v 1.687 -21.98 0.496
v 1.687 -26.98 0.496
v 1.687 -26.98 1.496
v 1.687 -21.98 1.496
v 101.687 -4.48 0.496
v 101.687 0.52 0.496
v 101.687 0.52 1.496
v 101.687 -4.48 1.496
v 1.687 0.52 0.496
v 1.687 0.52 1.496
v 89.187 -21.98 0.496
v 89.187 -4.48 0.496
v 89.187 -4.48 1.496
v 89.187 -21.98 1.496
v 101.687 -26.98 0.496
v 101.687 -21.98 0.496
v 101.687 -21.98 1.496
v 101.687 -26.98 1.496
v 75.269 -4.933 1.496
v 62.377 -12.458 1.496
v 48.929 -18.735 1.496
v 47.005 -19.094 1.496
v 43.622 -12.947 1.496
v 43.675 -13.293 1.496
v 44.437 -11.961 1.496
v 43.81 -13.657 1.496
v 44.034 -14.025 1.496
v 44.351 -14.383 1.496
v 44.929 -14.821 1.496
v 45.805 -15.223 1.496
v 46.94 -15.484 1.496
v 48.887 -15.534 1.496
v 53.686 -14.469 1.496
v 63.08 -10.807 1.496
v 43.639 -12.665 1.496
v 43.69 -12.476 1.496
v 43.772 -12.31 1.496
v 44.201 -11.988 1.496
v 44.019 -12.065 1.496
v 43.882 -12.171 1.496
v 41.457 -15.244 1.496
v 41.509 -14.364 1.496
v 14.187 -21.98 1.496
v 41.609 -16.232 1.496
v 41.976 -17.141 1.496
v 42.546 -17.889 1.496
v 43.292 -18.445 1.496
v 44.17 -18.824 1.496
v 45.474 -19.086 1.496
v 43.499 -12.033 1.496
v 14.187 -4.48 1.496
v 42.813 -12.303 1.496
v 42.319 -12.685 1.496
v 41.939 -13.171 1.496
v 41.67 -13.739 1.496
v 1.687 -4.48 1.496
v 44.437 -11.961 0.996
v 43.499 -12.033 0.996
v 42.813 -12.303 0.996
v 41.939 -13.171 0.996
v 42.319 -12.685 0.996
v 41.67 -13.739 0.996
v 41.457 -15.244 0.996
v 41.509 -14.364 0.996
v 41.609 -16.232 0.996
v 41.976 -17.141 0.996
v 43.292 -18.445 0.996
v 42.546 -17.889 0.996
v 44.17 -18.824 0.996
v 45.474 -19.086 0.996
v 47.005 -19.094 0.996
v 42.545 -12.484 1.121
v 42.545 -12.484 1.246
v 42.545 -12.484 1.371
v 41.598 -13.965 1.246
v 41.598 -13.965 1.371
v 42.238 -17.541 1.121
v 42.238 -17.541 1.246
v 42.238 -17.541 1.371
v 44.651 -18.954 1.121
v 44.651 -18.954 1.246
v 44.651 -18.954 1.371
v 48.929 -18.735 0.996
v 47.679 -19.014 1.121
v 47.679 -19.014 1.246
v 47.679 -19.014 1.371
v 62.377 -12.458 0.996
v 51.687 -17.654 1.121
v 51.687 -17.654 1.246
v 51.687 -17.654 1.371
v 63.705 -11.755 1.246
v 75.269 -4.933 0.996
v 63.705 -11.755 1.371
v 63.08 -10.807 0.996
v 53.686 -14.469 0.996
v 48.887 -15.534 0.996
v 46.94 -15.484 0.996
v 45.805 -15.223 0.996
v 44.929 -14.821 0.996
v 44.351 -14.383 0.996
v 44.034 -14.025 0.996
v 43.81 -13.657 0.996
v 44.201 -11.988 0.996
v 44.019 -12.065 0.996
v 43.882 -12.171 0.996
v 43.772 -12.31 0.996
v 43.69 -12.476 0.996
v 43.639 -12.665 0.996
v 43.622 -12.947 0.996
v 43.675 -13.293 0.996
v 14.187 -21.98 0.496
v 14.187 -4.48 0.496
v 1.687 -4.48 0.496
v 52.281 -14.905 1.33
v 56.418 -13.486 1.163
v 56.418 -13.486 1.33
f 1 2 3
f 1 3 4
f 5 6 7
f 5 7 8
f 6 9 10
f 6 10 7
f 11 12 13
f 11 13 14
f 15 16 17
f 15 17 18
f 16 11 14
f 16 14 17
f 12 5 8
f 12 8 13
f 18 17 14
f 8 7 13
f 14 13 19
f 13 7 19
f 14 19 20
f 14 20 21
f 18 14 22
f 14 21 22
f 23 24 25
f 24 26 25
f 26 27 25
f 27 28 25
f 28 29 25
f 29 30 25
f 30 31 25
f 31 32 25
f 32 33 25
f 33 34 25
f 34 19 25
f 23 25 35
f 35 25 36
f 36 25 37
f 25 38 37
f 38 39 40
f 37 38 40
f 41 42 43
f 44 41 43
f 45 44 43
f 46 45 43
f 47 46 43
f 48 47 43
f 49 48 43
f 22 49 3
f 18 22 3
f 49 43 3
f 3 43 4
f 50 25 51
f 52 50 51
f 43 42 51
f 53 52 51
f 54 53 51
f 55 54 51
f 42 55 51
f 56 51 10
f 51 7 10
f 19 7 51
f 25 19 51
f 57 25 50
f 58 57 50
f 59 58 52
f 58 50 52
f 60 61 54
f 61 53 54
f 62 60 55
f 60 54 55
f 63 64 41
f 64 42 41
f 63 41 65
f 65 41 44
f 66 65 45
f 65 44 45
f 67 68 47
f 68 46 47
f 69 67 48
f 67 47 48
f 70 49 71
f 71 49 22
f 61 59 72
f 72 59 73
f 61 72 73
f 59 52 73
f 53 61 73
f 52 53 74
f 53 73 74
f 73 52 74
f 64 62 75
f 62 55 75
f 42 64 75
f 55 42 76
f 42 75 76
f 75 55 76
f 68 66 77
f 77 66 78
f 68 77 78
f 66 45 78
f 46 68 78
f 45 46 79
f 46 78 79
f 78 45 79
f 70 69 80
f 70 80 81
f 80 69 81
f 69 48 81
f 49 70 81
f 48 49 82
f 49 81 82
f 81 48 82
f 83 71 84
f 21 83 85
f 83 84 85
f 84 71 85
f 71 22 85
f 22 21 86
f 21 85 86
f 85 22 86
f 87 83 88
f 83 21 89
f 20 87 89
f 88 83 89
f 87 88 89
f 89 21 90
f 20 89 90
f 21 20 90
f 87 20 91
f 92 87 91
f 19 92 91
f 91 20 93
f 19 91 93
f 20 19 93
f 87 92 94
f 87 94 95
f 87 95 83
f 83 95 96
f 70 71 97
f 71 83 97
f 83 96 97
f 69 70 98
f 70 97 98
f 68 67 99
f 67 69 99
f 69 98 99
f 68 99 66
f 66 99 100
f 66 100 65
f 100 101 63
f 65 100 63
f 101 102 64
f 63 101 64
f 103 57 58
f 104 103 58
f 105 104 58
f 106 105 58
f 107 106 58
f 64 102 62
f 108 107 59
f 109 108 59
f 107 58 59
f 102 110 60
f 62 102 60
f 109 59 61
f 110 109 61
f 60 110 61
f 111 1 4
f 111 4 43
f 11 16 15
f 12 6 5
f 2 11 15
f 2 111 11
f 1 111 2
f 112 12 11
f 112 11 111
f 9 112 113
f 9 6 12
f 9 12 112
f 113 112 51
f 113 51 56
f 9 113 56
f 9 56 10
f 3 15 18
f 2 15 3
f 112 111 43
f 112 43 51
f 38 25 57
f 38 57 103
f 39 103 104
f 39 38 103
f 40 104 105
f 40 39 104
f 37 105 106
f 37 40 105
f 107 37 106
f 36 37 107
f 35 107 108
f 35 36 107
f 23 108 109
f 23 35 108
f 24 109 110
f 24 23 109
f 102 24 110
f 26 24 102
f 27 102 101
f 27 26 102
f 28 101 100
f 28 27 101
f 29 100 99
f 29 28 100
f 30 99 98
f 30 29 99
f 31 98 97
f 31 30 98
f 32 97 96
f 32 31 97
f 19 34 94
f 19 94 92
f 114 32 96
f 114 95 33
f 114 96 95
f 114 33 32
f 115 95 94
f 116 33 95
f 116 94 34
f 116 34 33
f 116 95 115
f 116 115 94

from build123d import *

# Parameters (mm, degrees)
BOSS_EXTRUDE1_DEPTH = 2
CUT_EXTRUDE1_DEPTH  = 1
SCALE1_SCALE        = 0.5


with BuildPart() as part:
    # Sketch1 → Boss-Extrude1 (new body)
    with BuildSketch(Plane.XY):
        Polygon((-48.310810811, 14.243974201), (151.689189189, 14.243974201), (151.689189189, 4.243974201), (126.689189189, 4.243974201), (126.689189189, -30.756025799), (151.689189189, -30.756025799), (151.689189189, -40.756025799), (-48.310810811, -40.756025799), (-48.310810811, -30.756025799), (-23.310810811, -30.756025799), (-23.310810811, 4.243974201), (-48.310810811, 4.243974201), align=None)
    extrude(amount=BOSS_EXTRUDE1_DEPTH)

    # Sketch3 → Cut-Extrude1 (cut)
    with BuildSketch(Plane.XY.offset(2)):
        with BuildLine():
            add(Edge.make_bspline(
                [(37.189484824, -10.718294686), (33.474166953, -10.624199422), (35.300627772, -23.216467907), (74.220048032, -9.046257892), (87.664897587, -2.594986042), (98.853365994, 3.337442933)],
                knots=[0, 0, 0, 0, 0.51776511, 0.592619661, 1, 1, 1, 1], degree=3))
            add(Edge.make_bspline(
                [(37.189484824, -10.718294686), (30.815944463, -10.332745105), (29.156875012, -24.169852988), (43.250186434, -25.85327449), (65.190161886, -16.178918043), (83.996504619, -6.384768657), (98.853365994, 3.337442933)],
                knots=[0, 0, 0, 0, 0.163170519, 0.29176393, 0.388322168, 1, 1, 1, 1], degree=3))
        make_face()
    extrude(amount=-CUT_EXTRUDE1_DEPTH, mode=Mode.SUBTRACT)


with BuildPart() as part_1:
    # Scale1: scaled about (51.685288163, -13.204114524, 0.992436244)
    add(part.part.scale(SCALE1_SCALE).moved(Location((25.842644082, -6.602057262, 0.496218122))))


solid = part_1.part
